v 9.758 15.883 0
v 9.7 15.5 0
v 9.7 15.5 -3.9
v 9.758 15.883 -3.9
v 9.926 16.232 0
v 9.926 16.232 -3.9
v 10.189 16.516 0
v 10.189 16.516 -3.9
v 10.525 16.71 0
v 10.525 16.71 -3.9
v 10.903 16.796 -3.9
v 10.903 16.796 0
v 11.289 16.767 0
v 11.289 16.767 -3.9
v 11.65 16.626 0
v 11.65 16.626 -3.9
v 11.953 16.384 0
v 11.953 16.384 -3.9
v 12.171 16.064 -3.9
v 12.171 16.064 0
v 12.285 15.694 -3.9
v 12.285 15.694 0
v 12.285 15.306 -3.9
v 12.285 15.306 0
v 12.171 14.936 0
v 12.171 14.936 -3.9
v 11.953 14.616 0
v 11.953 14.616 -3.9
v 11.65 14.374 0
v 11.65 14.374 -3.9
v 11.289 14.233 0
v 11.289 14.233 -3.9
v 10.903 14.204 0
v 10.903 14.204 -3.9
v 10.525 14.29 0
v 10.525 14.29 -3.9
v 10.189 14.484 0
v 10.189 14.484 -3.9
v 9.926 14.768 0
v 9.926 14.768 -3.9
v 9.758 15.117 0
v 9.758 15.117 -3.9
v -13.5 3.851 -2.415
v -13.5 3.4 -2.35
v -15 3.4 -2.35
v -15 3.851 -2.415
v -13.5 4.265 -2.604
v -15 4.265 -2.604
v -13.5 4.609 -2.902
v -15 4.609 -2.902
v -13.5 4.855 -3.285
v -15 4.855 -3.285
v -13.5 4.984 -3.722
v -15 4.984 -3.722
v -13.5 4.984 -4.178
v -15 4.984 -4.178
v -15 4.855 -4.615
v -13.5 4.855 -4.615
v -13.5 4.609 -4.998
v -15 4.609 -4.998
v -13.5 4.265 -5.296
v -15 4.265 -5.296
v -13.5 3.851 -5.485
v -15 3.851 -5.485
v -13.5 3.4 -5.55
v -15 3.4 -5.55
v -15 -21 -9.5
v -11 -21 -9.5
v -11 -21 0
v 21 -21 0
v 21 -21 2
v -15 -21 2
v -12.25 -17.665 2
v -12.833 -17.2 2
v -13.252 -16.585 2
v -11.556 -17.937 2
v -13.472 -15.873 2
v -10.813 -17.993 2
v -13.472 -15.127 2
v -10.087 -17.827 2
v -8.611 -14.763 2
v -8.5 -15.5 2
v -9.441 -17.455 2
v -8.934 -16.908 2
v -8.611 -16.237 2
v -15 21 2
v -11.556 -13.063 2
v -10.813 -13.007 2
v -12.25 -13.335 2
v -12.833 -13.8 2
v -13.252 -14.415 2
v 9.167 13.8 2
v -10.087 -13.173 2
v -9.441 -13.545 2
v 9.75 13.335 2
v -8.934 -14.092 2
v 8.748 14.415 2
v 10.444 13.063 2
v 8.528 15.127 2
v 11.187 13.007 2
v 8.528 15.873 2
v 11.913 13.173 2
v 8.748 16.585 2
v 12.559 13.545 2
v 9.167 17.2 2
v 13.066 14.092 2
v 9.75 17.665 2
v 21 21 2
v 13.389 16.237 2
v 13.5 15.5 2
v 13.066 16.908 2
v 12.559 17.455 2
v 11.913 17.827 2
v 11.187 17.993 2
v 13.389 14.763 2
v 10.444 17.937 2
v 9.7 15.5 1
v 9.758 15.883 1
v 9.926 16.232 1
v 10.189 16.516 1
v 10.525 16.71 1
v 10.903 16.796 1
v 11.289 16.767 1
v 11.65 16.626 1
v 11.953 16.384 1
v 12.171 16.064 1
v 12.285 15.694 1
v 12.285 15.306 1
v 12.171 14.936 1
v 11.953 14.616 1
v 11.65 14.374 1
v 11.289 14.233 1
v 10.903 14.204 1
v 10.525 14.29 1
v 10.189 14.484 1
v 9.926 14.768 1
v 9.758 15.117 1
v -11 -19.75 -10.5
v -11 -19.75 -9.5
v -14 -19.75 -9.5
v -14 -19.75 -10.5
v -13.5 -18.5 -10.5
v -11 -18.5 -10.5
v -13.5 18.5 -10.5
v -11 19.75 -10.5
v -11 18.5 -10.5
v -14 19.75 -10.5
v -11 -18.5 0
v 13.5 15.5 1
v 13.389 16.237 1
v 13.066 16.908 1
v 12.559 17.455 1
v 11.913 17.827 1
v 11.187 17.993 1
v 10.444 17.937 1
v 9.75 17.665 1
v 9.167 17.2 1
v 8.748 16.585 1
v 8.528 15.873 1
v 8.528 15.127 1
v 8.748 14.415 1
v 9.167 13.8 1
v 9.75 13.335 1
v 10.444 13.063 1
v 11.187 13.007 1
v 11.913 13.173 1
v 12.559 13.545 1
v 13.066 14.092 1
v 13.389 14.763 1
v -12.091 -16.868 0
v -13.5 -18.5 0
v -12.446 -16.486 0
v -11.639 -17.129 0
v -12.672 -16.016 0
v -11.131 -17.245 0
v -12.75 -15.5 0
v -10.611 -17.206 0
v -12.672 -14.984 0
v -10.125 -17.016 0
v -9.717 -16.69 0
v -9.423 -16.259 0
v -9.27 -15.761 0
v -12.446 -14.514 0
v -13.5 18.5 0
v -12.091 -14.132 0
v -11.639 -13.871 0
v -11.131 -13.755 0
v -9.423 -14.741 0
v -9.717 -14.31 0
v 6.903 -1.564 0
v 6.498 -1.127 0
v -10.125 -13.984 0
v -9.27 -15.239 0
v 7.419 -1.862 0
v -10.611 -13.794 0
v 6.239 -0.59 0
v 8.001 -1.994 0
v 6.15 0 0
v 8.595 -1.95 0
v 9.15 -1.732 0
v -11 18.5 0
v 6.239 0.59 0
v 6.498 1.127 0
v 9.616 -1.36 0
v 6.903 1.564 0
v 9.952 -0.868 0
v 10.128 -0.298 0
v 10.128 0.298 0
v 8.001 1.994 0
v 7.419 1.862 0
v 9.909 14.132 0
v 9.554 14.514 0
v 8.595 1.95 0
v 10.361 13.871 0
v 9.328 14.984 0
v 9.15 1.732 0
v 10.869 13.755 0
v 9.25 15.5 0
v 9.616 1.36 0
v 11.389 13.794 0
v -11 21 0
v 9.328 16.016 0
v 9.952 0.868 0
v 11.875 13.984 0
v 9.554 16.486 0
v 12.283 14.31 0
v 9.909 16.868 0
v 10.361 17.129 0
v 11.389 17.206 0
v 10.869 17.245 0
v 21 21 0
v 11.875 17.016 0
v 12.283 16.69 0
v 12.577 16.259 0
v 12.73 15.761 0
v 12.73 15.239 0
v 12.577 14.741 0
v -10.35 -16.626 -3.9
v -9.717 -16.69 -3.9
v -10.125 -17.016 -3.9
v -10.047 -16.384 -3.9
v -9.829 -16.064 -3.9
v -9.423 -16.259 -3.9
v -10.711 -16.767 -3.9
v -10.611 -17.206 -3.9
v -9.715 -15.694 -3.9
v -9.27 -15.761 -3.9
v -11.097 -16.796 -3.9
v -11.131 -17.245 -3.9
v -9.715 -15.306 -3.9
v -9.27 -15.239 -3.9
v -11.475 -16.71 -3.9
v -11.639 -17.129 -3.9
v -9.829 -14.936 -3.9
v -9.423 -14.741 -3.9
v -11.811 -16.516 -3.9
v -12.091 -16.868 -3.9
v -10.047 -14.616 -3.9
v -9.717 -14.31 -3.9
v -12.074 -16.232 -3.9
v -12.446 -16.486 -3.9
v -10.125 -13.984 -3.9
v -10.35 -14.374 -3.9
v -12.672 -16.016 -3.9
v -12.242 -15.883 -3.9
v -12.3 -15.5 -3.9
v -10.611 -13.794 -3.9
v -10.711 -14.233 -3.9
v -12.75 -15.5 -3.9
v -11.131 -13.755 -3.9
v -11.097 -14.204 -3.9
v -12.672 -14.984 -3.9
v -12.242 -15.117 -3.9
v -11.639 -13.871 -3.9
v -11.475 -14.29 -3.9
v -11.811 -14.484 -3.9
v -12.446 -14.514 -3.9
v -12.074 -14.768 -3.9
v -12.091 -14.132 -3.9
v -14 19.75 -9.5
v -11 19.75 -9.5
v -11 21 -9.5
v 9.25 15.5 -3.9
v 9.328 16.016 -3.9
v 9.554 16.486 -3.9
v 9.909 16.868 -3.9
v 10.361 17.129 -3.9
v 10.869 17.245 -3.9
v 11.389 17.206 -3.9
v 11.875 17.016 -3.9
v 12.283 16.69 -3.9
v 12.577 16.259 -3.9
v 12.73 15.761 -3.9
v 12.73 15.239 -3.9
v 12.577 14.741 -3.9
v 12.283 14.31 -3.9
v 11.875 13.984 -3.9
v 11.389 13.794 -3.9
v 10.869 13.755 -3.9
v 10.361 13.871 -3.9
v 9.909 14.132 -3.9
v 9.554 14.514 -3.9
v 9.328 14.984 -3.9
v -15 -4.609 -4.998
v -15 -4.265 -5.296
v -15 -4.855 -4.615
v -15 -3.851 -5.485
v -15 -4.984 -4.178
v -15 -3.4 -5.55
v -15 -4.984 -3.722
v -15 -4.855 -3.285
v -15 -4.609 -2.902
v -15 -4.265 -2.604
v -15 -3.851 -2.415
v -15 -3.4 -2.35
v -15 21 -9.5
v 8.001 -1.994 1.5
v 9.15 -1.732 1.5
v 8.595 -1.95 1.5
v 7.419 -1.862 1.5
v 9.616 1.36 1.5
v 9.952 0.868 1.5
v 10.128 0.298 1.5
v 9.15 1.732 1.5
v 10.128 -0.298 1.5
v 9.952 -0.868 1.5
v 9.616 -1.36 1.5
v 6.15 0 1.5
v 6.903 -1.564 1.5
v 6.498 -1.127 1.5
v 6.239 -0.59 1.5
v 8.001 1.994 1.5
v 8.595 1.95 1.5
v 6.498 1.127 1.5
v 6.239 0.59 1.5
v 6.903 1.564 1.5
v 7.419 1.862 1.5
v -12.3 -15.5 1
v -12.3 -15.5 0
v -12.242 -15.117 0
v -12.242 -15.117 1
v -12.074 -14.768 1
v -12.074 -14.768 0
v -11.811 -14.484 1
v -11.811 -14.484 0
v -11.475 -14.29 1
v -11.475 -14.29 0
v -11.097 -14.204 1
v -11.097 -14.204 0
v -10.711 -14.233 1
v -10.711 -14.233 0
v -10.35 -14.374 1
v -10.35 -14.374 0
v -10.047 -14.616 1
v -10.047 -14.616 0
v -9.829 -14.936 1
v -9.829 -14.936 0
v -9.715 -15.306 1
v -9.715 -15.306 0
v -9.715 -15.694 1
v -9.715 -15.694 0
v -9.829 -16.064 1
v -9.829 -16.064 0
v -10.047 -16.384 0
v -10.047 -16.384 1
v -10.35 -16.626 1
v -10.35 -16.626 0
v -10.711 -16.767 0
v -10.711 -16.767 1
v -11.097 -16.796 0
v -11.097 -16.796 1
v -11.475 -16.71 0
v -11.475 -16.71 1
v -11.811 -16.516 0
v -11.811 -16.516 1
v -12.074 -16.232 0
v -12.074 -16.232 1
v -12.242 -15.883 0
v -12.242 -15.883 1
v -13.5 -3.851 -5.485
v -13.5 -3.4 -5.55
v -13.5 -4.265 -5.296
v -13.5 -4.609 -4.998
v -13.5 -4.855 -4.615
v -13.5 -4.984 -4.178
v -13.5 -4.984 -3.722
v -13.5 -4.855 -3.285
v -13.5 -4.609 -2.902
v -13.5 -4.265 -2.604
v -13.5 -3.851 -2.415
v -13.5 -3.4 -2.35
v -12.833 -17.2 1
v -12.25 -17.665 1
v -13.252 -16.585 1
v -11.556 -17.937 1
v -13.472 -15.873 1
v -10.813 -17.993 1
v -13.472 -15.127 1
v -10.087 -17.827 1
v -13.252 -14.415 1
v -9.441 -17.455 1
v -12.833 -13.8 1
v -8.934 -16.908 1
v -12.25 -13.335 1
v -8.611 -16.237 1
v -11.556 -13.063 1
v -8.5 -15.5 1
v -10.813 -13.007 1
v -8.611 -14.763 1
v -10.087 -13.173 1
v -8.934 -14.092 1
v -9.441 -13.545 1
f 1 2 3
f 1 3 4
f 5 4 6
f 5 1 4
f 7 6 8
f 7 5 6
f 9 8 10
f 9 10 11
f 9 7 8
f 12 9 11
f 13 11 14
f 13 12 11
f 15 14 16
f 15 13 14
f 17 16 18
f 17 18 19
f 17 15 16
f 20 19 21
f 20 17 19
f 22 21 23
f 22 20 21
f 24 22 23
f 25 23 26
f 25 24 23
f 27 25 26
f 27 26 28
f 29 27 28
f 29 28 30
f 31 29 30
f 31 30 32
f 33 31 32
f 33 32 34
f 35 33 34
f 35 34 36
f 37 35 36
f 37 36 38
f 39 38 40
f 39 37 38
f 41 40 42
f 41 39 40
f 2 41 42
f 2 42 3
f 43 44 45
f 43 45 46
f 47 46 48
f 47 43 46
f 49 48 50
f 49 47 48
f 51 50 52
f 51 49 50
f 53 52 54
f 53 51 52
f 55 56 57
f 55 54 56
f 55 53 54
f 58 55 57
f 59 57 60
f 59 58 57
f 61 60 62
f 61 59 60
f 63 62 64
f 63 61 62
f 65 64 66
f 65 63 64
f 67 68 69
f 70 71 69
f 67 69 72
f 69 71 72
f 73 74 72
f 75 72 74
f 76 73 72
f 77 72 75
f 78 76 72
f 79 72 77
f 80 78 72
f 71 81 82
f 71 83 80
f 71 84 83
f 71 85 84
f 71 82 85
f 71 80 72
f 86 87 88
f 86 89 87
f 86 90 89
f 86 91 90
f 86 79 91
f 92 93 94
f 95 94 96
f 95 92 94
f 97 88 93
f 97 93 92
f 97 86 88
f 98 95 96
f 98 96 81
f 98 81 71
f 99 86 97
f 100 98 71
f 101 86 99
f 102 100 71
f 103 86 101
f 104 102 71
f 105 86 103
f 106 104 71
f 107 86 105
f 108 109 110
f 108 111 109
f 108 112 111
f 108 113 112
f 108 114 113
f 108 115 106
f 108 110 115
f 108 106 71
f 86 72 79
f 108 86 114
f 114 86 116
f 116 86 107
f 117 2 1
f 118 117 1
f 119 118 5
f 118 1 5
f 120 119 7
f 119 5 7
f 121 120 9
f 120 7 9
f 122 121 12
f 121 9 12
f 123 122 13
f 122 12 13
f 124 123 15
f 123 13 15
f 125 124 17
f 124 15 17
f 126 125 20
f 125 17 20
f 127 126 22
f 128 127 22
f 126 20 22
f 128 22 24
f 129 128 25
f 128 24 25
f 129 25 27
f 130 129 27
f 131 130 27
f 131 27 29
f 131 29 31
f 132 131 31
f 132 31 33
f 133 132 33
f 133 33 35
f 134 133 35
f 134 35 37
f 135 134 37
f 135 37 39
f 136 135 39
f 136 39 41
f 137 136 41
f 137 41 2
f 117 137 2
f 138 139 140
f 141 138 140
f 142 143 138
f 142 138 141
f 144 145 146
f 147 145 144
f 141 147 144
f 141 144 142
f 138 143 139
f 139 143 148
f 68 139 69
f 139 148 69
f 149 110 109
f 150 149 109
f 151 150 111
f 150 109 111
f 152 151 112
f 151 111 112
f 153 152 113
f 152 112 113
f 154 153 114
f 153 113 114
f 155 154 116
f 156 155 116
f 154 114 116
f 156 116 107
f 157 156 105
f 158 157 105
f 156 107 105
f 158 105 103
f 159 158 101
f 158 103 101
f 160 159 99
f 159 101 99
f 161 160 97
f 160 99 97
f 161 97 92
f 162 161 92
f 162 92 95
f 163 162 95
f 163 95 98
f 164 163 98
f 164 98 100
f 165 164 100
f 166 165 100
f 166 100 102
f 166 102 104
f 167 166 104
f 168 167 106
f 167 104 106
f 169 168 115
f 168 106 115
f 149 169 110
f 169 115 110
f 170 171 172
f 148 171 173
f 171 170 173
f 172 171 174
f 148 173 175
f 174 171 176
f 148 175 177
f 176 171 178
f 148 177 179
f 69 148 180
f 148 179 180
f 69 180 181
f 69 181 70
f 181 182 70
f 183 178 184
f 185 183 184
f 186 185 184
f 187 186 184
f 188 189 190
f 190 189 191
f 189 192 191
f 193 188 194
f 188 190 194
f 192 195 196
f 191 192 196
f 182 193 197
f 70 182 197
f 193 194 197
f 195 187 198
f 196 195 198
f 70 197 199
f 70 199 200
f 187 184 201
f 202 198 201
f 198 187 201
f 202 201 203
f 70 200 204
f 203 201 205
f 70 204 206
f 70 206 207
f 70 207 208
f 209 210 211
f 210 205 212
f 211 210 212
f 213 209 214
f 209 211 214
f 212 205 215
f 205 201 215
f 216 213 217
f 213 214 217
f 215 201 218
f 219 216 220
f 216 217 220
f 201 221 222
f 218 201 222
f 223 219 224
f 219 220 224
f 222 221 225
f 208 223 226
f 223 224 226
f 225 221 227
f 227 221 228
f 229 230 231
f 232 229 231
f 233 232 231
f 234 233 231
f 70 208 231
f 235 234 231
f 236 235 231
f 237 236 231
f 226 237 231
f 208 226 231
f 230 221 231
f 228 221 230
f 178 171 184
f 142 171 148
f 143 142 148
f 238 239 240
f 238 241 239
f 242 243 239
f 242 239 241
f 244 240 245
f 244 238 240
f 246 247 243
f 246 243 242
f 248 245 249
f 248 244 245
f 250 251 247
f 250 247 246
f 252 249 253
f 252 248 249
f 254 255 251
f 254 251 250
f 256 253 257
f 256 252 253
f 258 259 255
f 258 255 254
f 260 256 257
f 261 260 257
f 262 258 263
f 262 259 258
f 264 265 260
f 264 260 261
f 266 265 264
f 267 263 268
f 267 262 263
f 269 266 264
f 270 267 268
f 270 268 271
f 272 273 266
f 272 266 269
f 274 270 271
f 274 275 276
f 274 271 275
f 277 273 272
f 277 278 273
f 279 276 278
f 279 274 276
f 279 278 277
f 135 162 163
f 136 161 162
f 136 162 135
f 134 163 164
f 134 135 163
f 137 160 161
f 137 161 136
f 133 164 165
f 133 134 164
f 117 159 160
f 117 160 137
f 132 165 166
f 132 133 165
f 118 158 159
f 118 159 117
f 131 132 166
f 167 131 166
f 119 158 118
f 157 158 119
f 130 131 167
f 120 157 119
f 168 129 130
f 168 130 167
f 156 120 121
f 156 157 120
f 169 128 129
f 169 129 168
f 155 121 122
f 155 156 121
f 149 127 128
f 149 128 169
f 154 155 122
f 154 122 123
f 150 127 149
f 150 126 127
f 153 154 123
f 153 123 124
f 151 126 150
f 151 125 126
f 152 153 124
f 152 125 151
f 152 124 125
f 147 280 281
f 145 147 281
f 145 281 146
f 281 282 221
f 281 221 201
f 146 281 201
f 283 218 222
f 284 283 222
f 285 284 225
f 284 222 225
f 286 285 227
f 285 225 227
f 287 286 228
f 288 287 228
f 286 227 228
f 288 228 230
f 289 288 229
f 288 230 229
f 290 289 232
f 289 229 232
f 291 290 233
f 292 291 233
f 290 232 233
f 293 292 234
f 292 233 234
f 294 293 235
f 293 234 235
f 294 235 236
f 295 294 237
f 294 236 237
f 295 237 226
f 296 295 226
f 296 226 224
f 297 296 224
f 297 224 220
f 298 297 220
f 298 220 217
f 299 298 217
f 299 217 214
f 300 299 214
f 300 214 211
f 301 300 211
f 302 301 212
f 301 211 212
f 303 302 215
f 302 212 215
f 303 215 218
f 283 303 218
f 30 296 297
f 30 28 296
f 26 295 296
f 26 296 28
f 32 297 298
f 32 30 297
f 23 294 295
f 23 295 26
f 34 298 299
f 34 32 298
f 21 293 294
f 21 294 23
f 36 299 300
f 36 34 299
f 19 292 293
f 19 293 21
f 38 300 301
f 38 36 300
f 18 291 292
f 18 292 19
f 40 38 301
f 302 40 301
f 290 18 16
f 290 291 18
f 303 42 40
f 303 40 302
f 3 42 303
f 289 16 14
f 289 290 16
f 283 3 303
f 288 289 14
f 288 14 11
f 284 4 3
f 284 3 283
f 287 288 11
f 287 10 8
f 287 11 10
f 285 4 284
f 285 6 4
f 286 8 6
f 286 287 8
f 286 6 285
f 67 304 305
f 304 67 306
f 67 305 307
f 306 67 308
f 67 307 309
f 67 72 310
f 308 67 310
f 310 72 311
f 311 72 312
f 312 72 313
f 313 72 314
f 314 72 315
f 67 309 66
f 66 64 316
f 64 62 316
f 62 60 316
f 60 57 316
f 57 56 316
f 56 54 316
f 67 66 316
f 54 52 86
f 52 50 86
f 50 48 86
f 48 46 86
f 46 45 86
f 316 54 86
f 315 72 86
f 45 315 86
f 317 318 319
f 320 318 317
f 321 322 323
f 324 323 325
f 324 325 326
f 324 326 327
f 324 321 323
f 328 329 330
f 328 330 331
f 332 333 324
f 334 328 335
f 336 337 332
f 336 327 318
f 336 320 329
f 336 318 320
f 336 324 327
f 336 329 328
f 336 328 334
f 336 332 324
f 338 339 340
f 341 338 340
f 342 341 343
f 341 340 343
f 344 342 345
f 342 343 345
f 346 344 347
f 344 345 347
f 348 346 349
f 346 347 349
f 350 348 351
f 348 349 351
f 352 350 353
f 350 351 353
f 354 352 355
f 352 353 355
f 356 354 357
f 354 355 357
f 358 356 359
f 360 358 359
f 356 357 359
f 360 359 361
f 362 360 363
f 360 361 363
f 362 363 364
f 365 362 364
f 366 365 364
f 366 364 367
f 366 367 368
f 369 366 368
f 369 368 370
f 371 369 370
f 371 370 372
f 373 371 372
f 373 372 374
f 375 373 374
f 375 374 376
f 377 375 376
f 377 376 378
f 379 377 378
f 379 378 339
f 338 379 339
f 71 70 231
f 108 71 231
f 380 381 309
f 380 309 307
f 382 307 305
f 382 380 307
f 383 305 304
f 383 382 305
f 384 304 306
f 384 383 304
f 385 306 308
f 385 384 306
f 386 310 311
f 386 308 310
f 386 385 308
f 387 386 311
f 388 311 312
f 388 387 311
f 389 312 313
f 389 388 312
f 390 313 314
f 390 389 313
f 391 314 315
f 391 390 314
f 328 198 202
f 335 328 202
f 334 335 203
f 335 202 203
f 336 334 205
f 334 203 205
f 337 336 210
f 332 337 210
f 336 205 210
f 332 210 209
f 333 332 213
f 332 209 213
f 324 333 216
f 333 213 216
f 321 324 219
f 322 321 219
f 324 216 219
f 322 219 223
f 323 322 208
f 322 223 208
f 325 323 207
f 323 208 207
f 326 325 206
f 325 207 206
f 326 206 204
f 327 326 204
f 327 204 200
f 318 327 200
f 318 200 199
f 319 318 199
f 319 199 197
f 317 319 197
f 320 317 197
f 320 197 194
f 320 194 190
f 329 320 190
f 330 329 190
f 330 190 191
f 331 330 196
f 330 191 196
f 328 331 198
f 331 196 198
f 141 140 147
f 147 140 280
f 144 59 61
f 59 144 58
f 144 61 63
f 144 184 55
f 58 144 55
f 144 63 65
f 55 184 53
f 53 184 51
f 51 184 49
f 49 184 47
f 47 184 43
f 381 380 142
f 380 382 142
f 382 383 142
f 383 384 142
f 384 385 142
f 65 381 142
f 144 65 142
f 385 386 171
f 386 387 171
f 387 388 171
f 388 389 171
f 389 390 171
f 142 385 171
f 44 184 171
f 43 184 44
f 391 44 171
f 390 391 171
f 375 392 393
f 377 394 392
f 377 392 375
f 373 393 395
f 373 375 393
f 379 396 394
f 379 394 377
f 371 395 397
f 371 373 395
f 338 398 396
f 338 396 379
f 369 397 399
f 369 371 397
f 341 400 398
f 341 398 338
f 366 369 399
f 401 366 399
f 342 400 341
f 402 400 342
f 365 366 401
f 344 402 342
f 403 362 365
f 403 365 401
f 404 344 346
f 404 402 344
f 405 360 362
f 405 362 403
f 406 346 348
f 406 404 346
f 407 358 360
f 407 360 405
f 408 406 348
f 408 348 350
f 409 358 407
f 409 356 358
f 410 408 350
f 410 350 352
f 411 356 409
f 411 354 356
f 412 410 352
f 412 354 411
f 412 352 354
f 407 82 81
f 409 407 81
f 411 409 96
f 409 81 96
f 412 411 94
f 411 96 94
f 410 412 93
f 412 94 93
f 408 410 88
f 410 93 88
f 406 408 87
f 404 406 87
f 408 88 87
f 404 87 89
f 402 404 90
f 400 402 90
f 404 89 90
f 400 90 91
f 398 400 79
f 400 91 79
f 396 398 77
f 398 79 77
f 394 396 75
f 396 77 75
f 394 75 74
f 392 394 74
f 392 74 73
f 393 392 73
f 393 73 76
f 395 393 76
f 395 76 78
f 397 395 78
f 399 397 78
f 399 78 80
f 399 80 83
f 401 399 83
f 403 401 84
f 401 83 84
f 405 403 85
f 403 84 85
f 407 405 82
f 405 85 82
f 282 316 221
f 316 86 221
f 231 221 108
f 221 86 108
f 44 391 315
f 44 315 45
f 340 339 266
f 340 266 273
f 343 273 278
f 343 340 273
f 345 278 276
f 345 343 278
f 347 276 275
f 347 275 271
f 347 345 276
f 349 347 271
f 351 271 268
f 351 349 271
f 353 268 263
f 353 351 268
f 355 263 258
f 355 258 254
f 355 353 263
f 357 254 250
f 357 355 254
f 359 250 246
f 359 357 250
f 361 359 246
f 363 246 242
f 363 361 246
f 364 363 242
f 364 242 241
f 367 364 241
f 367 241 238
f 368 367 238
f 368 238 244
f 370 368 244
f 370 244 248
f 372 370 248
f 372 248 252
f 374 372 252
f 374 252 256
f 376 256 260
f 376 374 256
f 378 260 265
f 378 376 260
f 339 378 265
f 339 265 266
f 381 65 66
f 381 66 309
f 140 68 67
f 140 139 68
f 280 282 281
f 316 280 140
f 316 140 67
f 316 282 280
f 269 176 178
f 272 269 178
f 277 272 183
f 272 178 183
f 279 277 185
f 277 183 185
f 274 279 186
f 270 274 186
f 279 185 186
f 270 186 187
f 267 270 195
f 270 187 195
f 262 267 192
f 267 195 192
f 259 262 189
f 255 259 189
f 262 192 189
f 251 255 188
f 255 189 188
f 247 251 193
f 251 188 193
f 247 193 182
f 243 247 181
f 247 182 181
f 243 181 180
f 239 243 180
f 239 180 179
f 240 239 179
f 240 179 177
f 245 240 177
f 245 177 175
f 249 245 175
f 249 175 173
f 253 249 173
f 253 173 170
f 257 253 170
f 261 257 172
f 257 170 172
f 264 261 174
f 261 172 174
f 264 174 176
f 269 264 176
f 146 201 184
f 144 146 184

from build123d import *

# Parameters (mm, degrees)
SKETCH_1_W          = 36
SKETCH_1_H          = 42
EXTRUDE_1_DEPTH     = 2
EXTRUDE_2_DEPTH     = 9.5
EXTRUDE_3_DEPTH     = 10.5
CUT_EXTRUDE_1_REACH = 43.731
SKETCH_4_R          = 1.75
SKETCH_4_R_2        = 1.3
EXTRUDE_4_DEPTH     = 3.9
CUT_EXTRUDE_2_REACH = 33.5
SKETCH_4_2_R        = 1.3
SKETCH_5_R          = 2.5
CUT_EXTRUDE_3_DEPTH = 1
SKETCH_6_R          = 2
CUT_EXTRUDE_4_DEPTH = 1.5


with BuildPart() as part:
    # 草图1 → 凸台-拉伸1 (new body)
    with BuildSketch(Plane.XY):
        with Locations((3, 0)):
            Rectangle(SKETCH_1_W, SKETCH_1_H)
    extrude(amount=EXTRUDE_1_DEPTH)

    # 草图2 → 凸台-拉伸2 (add)
    with BuildSketch(Plane(origin=(0, 0, 0), x_dir=(-1, 0, 0), z_dir=(0, 0, -1))):
        Polygon((15, -21), (15, 21), (11, 21), (11, 18.5), (13.5, 18.5), (13.5, -18.5), (11, -18.5), (11, -21), align=None)
    extrude(amount=EXTRUDE_2_DEPTH)

    # 草图2<3> → 凸台-拉伸3 (add)
    with BuildSketch(Plane(origin=(0, 0, 0), x_dir=(-1, 0, 0), z_dir=(0, 0, -1))):
        Polygon((14, 19.75), (11, 19.75), (11, 18.5), (13.5, 18.5), (13.5, -18.5), (11, -18.5), (11, -19.75), (14, -19.75), align=None)
    extrude(amount=EXTRUDE_3_DEPTH)

    # 草图3 → 切除-拉伸1 (cut, up to next)
    with BuildSketch(Plane(origin=(-13.5, 0, 0), x_dir=(0, 0, -1), z_dir=(1, 0, 0)), mode=Mode.PRIVATE) as cut_extrude_1_sk1:
        with BuildLine():
            Line((2.35, -3.4), (2.35, 3.4))
            ThreePointArc((2.35, 3.4), (3.95, 5), (5.55, 3.4))
            Line((5.55, 3.4), (5.55, -3.4))
            ThreePointArc((5.55, -3.4), (3.95, -5), (2.35, -3.4))
        make_face()
    cut_extrude_1_tool1 = extrude(cut_extrude_1_sk1.sketch, amount=-CUT_EXTRUDE_1_REACH, mode=Mode.PRIVATE) & part.part
    add(cut_extrude_1_tool1.solids().sort_by_distance((-13.5, 0, -3.95))[0], mode=Mode.SUBTRACT)

    # 草图4 → 凸台-拉伸4 (add)
    # profile 1 of 2: a face of its own
    with BuildSketch(Plane(origin=(0, 0, 0), x_dir=(-1, 0, 0), z_dir=(0, 0, -1))):
        with Locations((11, -15.5)):
            Circle(SKETCH_4_R)
        with Locations((11, -15.5)):
            Circle(SKETCH_4_R_2, mode=Mode.SUBTRACT)
    # profile 2 of 2: a face of its own
    with BuildSketch(Plane(origin=(0, 0, 0), x_dir=(-1, 0, 0), z_dir=(0, 0, -1))):
        with Locations((-11, 15.5)):
            Circle(SKETCH_4_R)
        with Locations((-11, 15.5)):
            Circle(SKETCH_4_R_2, mode=Mode.SUBTRACT)
    extrude(amount=EXTRUDE_4_DEPTH)

    # 草图4<2> → 切除-拉伸2 (cut, up to next)
    with BuildSketch(Plane(origin=(0, 0, 0), x_dir=(-1, 0, 0), z_dir=(0, 0, -1)), mode=Mode.PRIVATE) as cut_extrude_2_sk1:
        with Locations((11, -15.5)):
            Circle(SKETCH_4_2_R)
    cut_extrude_2_tool1 = extrude(cut_extrude_2_sk1.sketch, amount=-CUT_EXTRUDE_2_REACH, mode=Mode.PRIVATE) & part.part
    # 草图4<2> → 切除-拉伸2 (cut, up to next)
    with BuildSketch(Plane(origin=(0, 0, 0), x_dir=(-1, 0, 0), z_dir=(0, 0, -1)), mode=Mode.PRIVATE) as cut_extrude_2_sk2:
        with Locations((-11, 15.5)):
            Circle(SKETCH_4_2_R)
    cut_extrude_2_tool2 = extrude(cut_extrude_2_sk2.sketch, amount=-CUT_EXTRUDE_2_REACH, mode=Mode.PRIVATE) & part.part
    add(cut_extrude_2_tool1.solids().sort_by_distance((-11, -15.5, 0))[0], mode=Mode.SUBTRACT)
    add(cut_extrude_2_tool2.solids().sort_by_distance((11, 15.5, 0))[0], mode=Mode.SUBTRACT)

    # 草图5 → 切除-拉伸3 (cut)
    with BuildSketch(Plane.XY.offset(2)):
        with Locations((11, 15.5)):
            Circle(SKETCH_5_R)
        with Locations((-11, -15.5)):
            Circle(SKETCH_5_R)
    extrude(amount=-CUT_EXTRUDE_3_DEPTH, mode=Mode.SUBTRACT)

    # 草图6 → 切除-拉伸4 (cut)
    with BuildSketch(Plane(origin=(0, 0, 0), x_dir=(-1, 0, 0), z_dir=(0, 0, -1))):
        with Locations((-8.15, 0)):
            Circle(SKETCH_6_R)
    extrude(amount=-CUT_EXTRUDE_4_DEPTH, mode=Mode.SUBTRACT)


solid = part.part
